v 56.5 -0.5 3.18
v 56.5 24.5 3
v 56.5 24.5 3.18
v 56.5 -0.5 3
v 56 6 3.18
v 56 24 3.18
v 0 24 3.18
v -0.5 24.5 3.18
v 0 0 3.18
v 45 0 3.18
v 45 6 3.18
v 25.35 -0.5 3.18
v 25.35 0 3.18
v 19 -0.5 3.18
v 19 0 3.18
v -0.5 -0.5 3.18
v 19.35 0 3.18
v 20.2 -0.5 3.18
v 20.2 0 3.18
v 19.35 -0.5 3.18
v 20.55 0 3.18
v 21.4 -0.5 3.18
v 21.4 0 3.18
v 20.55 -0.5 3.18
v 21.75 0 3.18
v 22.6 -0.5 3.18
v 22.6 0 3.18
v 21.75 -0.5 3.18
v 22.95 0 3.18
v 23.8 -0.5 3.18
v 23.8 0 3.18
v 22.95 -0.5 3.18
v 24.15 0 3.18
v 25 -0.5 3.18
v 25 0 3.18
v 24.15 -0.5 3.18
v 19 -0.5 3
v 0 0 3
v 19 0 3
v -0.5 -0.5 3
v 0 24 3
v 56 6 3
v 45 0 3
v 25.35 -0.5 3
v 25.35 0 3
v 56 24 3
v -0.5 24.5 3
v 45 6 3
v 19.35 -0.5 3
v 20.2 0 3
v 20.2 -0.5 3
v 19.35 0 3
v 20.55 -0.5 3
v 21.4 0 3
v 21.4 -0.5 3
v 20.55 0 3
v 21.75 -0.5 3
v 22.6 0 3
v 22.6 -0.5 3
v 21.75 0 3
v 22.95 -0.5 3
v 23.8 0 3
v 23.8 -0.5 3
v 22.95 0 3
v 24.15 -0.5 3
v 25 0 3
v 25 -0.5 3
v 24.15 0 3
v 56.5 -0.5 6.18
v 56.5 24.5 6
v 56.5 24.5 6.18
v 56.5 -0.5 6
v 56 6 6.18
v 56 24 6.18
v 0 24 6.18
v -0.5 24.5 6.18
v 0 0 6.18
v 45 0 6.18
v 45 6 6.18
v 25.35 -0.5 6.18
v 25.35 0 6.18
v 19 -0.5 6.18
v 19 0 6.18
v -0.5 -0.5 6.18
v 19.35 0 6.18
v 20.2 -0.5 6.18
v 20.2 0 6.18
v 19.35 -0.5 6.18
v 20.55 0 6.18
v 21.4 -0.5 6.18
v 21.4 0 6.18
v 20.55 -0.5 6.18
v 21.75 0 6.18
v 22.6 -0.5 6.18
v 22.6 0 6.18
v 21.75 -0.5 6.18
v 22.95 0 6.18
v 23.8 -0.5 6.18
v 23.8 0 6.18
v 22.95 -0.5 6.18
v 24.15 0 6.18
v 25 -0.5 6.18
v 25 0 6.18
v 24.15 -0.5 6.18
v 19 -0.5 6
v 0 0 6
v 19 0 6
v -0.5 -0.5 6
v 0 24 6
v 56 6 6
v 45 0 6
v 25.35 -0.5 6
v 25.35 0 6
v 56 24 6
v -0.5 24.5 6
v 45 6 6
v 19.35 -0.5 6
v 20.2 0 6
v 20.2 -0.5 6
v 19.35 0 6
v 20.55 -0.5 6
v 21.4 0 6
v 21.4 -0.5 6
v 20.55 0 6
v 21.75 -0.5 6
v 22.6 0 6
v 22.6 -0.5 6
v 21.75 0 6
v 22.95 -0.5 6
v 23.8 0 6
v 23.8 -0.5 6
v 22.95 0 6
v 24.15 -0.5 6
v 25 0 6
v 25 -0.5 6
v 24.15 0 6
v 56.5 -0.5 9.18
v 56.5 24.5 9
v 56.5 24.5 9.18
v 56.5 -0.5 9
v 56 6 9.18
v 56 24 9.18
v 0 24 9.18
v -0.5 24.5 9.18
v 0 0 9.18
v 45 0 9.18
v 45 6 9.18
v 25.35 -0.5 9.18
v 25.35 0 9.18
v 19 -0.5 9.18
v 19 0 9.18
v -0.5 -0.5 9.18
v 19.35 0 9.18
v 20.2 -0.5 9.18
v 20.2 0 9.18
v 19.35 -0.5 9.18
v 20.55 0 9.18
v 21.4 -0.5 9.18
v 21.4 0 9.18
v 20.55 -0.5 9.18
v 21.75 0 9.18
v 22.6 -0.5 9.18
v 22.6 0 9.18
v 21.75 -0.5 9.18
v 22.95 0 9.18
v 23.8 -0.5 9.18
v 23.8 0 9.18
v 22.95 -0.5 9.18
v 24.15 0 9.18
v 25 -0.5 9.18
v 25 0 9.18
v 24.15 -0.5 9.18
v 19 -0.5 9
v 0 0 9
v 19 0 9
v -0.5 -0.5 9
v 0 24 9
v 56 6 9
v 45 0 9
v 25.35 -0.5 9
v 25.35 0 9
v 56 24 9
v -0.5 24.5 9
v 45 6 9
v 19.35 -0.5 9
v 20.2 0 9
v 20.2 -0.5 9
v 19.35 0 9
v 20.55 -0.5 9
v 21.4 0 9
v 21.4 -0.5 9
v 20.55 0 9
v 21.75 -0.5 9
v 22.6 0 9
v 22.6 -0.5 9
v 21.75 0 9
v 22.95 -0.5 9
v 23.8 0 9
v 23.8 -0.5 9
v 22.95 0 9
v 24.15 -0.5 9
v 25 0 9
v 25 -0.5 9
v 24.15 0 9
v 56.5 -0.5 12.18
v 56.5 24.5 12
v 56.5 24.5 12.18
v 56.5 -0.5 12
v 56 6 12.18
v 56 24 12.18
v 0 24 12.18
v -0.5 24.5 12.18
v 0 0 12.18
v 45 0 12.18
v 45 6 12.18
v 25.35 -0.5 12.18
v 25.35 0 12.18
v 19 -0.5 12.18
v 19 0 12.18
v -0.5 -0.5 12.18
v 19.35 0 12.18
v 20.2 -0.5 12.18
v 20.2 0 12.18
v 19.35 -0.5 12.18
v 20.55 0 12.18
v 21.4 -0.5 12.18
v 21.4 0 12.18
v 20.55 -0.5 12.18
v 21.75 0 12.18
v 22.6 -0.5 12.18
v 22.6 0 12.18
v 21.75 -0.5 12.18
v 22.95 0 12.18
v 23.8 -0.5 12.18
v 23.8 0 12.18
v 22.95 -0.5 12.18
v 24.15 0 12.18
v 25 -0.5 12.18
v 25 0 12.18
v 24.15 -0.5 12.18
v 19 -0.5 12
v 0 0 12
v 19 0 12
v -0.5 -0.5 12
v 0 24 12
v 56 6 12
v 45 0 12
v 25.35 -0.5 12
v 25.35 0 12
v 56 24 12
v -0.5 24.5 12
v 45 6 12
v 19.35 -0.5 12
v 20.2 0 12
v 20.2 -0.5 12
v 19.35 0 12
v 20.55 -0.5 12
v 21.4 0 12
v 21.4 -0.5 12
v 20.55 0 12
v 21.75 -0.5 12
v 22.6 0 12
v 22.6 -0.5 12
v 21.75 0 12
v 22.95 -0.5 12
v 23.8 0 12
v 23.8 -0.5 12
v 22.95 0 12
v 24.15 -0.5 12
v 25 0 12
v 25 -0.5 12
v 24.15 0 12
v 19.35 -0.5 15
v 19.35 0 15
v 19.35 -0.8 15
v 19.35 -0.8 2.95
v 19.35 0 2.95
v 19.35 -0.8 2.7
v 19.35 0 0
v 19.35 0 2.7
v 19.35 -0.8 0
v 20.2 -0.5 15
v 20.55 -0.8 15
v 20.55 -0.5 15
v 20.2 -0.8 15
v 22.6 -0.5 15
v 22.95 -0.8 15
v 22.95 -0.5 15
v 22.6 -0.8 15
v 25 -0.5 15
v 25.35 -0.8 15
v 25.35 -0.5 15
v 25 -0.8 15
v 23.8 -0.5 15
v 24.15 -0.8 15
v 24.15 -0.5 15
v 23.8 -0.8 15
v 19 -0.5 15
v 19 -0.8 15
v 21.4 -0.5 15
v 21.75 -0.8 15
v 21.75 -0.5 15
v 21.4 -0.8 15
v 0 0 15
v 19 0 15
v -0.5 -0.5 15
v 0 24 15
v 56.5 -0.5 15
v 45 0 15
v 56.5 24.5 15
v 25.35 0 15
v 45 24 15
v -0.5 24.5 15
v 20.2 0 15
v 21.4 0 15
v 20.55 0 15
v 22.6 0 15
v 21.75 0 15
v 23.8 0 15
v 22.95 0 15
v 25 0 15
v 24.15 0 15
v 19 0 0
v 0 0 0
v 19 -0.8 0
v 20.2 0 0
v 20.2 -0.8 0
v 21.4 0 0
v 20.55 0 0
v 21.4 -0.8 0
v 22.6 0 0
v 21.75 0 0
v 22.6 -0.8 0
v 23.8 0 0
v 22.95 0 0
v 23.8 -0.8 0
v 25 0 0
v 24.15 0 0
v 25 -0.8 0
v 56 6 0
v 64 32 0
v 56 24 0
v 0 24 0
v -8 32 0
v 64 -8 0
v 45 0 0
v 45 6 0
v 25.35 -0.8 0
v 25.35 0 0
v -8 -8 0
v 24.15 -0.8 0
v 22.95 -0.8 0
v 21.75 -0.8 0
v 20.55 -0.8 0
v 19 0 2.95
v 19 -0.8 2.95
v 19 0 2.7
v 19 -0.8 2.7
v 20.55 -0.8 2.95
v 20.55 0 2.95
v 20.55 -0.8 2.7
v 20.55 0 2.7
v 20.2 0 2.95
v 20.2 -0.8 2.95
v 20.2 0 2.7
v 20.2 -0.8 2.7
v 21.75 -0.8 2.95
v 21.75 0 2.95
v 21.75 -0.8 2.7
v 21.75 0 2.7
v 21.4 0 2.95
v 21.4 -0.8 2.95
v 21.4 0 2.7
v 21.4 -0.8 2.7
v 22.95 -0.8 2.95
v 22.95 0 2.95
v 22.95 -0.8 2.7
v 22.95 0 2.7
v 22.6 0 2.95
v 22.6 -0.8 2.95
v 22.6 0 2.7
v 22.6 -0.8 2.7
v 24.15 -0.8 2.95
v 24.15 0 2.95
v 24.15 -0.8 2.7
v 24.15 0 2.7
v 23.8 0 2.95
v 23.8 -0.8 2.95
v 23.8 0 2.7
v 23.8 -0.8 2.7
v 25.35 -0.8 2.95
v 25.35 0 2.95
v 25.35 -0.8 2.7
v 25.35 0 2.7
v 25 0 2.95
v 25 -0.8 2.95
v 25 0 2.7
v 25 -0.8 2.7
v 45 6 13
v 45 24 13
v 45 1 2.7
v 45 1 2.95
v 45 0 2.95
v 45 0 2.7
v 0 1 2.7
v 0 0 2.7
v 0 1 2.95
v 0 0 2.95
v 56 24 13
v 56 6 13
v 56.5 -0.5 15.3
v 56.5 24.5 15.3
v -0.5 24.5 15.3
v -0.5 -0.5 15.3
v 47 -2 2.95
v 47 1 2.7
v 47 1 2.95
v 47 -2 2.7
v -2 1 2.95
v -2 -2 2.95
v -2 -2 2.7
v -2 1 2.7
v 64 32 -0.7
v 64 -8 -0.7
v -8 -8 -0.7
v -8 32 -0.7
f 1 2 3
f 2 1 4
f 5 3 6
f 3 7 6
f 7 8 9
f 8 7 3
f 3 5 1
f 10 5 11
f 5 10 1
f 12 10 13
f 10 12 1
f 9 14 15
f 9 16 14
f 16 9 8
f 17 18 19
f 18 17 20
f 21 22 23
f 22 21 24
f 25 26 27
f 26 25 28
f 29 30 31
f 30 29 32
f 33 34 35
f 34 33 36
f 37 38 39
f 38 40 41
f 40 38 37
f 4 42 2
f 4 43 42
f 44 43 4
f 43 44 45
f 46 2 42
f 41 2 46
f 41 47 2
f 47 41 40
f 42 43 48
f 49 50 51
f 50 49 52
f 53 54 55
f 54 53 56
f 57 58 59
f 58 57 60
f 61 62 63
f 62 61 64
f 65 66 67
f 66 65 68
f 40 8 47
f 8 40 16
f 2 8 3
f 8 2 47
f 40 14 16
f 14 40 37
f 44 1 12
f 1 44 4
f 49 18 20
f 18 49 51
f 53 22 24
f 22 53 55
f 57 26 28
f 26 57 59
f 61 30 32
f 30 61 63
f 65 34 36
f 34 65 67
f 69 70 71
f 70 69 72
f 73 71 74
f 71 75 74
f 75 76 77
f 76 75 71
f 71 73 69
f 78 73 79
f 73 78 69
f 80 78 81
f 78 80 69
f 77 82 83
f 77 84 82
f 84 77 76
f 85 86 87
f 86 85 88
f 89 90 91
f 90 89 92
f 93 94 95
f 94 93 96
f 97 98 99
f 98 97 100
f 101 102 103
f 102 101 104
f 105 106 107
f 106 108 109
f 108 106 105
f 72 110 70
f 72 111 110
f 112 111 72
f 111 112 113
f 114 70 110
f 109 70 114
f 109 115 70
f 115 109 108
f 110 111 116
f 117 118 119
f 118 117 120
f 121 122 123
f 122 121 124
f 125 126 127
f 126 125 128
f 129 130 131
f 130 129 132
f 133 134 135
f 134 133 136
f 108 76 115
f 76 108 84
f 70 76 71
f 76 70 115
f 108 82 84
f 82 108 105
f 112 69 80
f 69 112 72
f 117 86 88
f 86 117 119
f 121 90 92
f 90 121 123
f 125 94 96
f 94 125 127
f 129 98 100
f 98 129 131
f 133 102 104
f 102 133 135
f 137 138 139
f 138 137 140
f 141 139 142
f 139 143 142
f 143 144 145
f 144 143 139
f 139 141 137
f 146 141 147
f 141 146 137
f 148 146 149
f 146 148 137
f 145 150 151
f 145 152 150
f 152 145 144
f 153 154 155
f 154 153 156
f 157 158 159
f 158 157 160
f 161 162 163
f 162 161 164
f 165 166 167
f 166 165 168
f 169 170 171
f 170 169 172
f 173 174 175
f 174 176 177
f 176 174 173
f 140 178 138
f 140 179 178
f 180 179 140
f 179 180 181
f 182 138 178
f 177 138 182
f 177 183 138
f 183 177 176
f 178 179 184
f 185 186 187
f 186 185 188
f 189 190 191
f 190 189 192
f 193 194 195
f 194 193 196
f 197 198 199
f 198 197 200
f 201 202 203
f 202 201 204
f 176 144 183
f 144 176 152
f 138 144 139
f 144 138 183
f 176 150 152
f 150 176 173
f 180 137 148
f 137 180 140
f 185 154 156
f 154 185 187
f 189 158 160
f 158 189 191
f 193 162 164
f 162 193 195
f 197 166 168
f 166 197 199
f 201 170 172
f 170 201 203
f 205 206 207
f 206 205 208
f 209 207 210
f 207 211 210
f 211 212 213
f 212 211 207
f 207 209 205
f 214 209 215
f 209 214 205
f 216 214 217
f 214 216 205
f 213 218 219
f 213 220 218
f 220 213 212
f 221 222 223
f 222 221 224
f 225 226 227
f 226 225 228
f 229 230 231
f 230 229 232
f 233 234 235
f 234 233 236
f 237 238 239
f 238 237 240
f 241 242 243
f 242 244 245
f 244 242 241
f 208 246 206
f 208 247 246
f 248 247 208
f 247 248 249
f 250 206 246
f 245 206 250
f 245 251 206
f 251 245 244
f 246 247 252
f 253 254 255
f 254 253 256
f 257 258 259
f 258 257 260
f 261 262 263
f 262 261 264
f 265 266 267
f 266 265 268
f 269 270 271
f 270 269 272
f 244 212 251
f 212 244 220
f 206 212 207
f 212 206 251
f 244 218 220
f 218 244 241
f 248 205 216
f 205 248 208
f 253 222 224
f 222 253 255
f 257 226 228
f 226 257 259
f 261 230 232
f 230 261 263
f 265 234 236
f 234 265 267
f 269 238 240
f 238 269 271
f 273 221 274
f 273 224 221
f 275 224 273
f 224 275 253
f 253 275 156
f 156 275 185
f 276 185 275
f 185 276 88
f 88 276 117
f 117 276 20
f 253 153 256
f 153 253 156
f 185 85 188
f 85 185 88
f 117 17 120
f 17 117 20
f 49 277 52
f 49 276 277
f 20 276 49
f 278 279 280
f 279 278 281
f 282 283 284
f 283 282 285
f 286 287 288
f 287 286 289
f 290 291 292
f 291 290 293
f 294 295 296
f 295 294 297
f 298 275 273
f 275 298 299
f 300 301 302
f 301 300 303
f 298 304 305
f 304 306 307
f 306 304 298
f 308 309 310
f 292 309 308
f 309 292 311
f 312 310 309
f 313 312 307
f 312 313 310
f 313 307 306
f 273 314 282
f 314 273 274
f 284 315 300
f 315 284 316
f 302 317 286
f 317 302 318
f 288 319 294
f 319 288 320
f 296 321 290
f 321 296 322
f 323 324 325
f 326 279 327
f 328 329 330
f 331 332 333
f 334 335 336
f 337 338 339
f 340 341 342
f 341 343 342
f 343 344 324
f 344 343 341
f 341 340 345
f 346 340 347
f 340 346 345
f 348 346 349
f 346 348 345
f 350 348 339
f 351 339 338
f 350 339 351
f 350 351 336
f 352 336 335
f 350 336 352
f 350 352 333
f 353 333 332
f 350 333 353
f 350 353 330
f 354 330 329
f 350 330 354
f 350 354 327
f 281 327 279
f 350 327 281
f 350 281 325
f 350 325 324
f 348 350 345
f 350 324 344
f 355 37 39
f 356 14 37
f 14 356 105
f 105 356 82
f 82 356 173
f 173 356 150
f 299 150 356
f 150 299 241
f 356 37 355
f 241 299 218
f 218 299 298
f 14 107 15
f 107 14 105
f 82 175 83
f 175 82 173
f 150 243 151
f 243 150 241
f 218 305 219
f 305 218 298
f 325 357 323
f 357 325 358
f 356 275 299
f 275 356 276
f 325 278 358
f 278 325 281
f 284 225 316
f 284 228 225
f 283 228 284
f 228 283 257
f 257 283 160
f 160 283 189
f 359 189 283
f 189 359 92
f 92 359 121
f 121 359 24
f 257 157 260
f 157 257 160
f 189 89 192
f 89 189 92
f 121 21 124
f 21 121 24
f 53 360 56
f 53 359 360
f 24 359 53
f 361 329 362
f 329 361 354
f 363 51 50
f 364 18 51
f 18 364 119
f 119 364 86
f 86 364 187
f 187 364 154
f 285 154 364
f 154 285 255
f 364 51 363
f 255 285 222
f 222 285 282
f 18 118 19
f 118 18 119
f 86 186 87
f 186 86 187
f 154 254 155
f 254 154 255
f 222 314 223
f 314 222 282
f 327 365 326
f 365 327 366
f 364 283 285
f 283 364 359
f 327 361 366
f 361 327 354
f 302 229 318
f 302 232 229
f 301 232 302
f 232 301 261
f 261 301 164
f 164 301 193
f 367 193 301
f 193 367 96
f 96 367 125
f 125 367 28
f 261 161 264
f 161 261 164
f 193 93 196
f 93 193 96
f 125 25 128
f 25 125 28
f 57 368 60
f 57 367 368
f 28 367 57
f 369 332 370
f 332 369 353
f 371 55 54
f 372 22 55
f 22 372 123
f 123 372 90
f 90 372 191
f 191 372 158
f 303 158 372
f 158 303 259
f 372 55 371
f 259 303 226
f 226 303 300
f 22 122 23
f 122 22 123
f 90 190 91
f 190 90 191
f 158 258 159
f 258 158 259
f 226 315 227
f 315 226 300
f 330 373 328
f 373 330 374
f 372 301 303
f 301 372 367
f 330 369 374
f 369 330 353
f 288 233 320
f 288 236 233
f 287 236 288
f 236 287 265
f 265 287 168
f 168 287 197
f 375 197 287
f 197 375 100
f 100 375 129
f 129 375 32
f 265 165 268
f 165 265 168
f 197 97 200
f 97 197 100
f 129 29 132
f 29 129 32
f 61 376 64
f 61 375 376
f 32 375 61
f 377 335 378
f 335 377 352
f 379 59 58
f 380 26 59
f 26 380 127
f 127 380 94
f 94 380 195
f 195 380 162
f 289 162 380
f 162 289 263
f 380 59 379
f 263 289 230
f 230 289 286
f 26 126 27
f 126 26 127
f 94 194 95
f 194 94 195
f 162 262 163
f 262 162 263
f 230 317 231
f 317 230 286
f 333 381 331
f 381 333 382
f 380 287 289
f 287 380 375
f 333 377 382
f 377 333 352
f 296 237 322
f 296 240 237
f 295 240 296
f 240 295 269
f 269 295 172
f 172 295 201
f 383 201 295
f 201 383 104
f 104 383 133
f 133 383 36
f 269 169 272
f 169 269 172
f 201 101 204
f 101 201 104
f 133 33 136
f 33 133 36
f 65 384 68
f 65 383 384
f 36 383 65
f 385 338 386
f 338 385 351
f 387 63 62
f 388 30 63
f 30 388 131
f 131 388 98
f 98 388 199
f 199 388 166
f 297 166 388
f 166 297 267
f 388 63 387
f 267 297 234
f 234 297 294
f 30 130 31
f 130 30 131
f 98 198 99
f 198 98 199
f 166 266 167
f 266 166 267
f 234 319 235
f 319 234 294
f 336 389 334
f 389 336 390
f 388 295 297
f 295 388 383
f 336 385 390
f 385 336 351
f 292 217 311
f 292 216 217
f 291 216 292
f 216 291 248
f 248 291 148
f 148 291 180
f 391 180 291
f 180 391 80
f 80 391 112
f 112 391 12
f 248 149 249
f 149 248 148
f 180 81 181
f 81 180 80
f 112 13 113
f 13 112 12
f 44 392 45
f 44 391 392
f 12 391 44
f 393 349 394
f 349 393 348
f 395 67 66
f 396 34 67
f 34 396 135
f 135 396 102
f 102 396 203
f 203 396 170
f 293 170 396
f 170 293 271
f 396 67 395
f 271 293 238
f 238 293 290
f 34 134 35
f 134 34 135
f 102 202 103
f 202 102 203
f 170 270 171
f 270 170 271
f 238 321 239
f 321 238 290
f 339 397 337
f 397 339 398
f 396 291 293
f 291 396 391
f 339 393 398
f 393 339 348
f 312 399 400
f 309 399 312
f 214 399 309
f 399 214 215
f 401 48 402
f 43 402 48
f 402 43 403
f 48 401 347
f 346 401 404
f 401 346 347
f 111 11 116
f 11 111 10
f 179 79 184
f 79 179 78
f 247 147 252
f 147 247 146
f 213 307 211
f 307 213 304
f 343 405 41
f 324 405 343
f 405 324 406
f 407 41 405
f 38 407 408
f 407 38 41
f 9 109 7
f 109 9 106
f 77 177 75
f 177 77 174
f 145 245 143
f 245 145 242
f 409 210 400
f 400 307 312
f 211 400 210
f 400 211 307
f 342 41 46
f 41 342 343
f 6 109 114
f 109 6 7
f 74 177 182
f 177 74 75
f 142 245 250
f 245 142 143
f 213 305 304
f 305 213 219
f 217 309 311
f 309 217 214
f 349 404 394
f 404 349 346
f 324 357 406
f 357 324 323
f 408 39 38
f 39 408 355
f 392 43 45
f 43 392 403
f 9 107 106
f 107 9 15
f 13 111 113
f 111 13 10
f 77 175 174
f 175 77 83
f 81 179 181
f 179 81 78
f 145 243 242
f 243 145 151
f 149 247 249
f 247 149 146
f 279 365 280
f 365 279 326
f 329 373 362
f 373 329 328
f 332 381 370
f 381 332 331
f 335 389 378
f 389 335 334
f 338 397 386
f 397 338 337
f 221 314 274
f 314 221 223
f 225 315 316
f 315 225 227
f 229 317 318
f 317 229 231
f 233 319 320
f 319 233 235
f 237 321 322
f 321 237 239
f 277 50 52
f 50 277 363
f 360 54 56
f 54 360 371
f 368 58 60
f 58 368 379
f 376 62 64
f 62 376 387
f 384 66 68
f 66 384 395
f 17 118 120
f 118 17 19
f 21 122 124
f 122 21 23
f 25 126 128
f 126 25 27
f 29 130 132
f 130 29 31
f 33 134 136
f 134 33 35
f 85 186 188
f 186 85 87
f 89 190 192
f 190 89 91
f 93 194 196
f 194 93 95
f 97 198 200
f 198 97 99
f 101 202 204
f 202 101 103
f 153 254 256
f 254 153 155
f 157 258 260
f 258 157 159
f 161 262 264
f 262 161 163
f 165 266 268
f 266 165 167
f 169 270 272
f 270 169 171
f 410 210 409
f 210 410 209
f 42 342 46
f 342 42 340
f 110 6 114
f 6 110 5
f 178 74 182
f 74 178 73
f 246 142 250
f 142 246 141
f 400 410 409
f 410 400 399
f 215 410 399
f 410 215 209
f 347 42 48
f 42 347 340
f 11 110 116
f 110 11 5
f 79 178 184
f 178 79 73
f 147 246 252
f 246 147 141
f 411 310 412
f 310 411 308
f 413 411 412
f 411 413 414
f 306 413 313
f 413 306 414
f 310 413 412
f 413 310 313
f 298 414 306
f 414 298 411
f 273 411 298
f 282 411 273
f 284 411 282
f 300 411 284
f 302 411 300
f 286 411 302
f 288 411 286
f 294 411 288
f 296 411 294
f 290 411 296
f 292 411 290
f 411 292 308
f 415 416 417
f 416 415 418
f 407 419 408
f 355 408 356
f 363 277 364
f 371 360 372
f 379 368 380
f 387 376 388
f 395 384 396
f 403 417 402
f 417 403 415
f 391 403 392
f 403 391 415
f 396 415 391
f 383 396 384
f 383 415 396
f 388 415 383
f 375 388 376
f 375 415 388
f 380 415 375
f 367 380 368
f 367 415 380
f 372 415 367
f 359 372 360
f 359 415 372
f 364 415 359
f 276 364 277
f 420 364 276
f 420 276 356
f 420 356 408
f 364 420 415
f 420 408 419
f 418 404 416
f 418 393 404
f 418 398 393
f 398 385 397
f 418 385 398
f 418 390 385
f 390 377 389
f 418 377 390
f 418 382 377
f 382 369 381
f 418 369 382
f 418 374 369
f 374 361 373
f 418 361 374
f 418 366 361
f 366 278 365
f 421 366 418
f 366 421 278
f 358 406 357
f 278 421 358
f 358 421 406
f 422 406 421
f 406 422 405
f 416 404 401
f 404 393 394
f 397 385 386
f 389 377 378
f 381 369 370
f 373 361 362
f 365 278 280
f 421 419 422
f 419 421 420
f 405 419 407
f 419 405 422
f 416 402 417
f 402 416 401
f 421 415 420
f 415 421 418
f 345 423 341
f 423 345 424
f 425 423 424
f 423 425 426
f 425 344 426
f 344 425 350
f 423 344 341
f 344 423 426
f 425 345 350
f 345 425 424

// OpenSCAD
// Aalamban One — conceptual massing model
// Artist's architectural concept only; not a sanctioned structural/facade model.
$fn=24;
module glass_block(size=[10,10,10],pos=[0,0,0]){translate(pos) cube(size);}
module fin(x,y,z,h){translate([x,y,z]) cube([0.35,1.2,h]);}
// Main commercial volume
color([0.08,0.13,0.18]) glass_block([45,24,15],[0,0,0]);
// Corner wing
color([0.07,0.11,0.15]) glass_block([11,18,13],[45,6,0]);
// Floor slabs
for(z=[3,6,9,12]) color([0.72,0.50,0.24]) translate([-0.5,-0.5,z]) cube([57,25,0.18]);
// Premium vertical feature / fins
color([0.72,0.50,0.24]) for(x=[19:1.2:25]) fin(x,-0.8,0,15);
// Roof datum
color([0.72,0.50,0.24]) translate([-0.5,-0.5,15]) cube([57,25,0.3]);
// Canopy
color([0.72,0.50,0.24]) translate([-2,-2,2.7]) cube([49,3,0.25]);
// Site plinth
color([0.18,0.18,0.18]) translate([-8,-8,-0.7]) cube([72,40,0.7]);
